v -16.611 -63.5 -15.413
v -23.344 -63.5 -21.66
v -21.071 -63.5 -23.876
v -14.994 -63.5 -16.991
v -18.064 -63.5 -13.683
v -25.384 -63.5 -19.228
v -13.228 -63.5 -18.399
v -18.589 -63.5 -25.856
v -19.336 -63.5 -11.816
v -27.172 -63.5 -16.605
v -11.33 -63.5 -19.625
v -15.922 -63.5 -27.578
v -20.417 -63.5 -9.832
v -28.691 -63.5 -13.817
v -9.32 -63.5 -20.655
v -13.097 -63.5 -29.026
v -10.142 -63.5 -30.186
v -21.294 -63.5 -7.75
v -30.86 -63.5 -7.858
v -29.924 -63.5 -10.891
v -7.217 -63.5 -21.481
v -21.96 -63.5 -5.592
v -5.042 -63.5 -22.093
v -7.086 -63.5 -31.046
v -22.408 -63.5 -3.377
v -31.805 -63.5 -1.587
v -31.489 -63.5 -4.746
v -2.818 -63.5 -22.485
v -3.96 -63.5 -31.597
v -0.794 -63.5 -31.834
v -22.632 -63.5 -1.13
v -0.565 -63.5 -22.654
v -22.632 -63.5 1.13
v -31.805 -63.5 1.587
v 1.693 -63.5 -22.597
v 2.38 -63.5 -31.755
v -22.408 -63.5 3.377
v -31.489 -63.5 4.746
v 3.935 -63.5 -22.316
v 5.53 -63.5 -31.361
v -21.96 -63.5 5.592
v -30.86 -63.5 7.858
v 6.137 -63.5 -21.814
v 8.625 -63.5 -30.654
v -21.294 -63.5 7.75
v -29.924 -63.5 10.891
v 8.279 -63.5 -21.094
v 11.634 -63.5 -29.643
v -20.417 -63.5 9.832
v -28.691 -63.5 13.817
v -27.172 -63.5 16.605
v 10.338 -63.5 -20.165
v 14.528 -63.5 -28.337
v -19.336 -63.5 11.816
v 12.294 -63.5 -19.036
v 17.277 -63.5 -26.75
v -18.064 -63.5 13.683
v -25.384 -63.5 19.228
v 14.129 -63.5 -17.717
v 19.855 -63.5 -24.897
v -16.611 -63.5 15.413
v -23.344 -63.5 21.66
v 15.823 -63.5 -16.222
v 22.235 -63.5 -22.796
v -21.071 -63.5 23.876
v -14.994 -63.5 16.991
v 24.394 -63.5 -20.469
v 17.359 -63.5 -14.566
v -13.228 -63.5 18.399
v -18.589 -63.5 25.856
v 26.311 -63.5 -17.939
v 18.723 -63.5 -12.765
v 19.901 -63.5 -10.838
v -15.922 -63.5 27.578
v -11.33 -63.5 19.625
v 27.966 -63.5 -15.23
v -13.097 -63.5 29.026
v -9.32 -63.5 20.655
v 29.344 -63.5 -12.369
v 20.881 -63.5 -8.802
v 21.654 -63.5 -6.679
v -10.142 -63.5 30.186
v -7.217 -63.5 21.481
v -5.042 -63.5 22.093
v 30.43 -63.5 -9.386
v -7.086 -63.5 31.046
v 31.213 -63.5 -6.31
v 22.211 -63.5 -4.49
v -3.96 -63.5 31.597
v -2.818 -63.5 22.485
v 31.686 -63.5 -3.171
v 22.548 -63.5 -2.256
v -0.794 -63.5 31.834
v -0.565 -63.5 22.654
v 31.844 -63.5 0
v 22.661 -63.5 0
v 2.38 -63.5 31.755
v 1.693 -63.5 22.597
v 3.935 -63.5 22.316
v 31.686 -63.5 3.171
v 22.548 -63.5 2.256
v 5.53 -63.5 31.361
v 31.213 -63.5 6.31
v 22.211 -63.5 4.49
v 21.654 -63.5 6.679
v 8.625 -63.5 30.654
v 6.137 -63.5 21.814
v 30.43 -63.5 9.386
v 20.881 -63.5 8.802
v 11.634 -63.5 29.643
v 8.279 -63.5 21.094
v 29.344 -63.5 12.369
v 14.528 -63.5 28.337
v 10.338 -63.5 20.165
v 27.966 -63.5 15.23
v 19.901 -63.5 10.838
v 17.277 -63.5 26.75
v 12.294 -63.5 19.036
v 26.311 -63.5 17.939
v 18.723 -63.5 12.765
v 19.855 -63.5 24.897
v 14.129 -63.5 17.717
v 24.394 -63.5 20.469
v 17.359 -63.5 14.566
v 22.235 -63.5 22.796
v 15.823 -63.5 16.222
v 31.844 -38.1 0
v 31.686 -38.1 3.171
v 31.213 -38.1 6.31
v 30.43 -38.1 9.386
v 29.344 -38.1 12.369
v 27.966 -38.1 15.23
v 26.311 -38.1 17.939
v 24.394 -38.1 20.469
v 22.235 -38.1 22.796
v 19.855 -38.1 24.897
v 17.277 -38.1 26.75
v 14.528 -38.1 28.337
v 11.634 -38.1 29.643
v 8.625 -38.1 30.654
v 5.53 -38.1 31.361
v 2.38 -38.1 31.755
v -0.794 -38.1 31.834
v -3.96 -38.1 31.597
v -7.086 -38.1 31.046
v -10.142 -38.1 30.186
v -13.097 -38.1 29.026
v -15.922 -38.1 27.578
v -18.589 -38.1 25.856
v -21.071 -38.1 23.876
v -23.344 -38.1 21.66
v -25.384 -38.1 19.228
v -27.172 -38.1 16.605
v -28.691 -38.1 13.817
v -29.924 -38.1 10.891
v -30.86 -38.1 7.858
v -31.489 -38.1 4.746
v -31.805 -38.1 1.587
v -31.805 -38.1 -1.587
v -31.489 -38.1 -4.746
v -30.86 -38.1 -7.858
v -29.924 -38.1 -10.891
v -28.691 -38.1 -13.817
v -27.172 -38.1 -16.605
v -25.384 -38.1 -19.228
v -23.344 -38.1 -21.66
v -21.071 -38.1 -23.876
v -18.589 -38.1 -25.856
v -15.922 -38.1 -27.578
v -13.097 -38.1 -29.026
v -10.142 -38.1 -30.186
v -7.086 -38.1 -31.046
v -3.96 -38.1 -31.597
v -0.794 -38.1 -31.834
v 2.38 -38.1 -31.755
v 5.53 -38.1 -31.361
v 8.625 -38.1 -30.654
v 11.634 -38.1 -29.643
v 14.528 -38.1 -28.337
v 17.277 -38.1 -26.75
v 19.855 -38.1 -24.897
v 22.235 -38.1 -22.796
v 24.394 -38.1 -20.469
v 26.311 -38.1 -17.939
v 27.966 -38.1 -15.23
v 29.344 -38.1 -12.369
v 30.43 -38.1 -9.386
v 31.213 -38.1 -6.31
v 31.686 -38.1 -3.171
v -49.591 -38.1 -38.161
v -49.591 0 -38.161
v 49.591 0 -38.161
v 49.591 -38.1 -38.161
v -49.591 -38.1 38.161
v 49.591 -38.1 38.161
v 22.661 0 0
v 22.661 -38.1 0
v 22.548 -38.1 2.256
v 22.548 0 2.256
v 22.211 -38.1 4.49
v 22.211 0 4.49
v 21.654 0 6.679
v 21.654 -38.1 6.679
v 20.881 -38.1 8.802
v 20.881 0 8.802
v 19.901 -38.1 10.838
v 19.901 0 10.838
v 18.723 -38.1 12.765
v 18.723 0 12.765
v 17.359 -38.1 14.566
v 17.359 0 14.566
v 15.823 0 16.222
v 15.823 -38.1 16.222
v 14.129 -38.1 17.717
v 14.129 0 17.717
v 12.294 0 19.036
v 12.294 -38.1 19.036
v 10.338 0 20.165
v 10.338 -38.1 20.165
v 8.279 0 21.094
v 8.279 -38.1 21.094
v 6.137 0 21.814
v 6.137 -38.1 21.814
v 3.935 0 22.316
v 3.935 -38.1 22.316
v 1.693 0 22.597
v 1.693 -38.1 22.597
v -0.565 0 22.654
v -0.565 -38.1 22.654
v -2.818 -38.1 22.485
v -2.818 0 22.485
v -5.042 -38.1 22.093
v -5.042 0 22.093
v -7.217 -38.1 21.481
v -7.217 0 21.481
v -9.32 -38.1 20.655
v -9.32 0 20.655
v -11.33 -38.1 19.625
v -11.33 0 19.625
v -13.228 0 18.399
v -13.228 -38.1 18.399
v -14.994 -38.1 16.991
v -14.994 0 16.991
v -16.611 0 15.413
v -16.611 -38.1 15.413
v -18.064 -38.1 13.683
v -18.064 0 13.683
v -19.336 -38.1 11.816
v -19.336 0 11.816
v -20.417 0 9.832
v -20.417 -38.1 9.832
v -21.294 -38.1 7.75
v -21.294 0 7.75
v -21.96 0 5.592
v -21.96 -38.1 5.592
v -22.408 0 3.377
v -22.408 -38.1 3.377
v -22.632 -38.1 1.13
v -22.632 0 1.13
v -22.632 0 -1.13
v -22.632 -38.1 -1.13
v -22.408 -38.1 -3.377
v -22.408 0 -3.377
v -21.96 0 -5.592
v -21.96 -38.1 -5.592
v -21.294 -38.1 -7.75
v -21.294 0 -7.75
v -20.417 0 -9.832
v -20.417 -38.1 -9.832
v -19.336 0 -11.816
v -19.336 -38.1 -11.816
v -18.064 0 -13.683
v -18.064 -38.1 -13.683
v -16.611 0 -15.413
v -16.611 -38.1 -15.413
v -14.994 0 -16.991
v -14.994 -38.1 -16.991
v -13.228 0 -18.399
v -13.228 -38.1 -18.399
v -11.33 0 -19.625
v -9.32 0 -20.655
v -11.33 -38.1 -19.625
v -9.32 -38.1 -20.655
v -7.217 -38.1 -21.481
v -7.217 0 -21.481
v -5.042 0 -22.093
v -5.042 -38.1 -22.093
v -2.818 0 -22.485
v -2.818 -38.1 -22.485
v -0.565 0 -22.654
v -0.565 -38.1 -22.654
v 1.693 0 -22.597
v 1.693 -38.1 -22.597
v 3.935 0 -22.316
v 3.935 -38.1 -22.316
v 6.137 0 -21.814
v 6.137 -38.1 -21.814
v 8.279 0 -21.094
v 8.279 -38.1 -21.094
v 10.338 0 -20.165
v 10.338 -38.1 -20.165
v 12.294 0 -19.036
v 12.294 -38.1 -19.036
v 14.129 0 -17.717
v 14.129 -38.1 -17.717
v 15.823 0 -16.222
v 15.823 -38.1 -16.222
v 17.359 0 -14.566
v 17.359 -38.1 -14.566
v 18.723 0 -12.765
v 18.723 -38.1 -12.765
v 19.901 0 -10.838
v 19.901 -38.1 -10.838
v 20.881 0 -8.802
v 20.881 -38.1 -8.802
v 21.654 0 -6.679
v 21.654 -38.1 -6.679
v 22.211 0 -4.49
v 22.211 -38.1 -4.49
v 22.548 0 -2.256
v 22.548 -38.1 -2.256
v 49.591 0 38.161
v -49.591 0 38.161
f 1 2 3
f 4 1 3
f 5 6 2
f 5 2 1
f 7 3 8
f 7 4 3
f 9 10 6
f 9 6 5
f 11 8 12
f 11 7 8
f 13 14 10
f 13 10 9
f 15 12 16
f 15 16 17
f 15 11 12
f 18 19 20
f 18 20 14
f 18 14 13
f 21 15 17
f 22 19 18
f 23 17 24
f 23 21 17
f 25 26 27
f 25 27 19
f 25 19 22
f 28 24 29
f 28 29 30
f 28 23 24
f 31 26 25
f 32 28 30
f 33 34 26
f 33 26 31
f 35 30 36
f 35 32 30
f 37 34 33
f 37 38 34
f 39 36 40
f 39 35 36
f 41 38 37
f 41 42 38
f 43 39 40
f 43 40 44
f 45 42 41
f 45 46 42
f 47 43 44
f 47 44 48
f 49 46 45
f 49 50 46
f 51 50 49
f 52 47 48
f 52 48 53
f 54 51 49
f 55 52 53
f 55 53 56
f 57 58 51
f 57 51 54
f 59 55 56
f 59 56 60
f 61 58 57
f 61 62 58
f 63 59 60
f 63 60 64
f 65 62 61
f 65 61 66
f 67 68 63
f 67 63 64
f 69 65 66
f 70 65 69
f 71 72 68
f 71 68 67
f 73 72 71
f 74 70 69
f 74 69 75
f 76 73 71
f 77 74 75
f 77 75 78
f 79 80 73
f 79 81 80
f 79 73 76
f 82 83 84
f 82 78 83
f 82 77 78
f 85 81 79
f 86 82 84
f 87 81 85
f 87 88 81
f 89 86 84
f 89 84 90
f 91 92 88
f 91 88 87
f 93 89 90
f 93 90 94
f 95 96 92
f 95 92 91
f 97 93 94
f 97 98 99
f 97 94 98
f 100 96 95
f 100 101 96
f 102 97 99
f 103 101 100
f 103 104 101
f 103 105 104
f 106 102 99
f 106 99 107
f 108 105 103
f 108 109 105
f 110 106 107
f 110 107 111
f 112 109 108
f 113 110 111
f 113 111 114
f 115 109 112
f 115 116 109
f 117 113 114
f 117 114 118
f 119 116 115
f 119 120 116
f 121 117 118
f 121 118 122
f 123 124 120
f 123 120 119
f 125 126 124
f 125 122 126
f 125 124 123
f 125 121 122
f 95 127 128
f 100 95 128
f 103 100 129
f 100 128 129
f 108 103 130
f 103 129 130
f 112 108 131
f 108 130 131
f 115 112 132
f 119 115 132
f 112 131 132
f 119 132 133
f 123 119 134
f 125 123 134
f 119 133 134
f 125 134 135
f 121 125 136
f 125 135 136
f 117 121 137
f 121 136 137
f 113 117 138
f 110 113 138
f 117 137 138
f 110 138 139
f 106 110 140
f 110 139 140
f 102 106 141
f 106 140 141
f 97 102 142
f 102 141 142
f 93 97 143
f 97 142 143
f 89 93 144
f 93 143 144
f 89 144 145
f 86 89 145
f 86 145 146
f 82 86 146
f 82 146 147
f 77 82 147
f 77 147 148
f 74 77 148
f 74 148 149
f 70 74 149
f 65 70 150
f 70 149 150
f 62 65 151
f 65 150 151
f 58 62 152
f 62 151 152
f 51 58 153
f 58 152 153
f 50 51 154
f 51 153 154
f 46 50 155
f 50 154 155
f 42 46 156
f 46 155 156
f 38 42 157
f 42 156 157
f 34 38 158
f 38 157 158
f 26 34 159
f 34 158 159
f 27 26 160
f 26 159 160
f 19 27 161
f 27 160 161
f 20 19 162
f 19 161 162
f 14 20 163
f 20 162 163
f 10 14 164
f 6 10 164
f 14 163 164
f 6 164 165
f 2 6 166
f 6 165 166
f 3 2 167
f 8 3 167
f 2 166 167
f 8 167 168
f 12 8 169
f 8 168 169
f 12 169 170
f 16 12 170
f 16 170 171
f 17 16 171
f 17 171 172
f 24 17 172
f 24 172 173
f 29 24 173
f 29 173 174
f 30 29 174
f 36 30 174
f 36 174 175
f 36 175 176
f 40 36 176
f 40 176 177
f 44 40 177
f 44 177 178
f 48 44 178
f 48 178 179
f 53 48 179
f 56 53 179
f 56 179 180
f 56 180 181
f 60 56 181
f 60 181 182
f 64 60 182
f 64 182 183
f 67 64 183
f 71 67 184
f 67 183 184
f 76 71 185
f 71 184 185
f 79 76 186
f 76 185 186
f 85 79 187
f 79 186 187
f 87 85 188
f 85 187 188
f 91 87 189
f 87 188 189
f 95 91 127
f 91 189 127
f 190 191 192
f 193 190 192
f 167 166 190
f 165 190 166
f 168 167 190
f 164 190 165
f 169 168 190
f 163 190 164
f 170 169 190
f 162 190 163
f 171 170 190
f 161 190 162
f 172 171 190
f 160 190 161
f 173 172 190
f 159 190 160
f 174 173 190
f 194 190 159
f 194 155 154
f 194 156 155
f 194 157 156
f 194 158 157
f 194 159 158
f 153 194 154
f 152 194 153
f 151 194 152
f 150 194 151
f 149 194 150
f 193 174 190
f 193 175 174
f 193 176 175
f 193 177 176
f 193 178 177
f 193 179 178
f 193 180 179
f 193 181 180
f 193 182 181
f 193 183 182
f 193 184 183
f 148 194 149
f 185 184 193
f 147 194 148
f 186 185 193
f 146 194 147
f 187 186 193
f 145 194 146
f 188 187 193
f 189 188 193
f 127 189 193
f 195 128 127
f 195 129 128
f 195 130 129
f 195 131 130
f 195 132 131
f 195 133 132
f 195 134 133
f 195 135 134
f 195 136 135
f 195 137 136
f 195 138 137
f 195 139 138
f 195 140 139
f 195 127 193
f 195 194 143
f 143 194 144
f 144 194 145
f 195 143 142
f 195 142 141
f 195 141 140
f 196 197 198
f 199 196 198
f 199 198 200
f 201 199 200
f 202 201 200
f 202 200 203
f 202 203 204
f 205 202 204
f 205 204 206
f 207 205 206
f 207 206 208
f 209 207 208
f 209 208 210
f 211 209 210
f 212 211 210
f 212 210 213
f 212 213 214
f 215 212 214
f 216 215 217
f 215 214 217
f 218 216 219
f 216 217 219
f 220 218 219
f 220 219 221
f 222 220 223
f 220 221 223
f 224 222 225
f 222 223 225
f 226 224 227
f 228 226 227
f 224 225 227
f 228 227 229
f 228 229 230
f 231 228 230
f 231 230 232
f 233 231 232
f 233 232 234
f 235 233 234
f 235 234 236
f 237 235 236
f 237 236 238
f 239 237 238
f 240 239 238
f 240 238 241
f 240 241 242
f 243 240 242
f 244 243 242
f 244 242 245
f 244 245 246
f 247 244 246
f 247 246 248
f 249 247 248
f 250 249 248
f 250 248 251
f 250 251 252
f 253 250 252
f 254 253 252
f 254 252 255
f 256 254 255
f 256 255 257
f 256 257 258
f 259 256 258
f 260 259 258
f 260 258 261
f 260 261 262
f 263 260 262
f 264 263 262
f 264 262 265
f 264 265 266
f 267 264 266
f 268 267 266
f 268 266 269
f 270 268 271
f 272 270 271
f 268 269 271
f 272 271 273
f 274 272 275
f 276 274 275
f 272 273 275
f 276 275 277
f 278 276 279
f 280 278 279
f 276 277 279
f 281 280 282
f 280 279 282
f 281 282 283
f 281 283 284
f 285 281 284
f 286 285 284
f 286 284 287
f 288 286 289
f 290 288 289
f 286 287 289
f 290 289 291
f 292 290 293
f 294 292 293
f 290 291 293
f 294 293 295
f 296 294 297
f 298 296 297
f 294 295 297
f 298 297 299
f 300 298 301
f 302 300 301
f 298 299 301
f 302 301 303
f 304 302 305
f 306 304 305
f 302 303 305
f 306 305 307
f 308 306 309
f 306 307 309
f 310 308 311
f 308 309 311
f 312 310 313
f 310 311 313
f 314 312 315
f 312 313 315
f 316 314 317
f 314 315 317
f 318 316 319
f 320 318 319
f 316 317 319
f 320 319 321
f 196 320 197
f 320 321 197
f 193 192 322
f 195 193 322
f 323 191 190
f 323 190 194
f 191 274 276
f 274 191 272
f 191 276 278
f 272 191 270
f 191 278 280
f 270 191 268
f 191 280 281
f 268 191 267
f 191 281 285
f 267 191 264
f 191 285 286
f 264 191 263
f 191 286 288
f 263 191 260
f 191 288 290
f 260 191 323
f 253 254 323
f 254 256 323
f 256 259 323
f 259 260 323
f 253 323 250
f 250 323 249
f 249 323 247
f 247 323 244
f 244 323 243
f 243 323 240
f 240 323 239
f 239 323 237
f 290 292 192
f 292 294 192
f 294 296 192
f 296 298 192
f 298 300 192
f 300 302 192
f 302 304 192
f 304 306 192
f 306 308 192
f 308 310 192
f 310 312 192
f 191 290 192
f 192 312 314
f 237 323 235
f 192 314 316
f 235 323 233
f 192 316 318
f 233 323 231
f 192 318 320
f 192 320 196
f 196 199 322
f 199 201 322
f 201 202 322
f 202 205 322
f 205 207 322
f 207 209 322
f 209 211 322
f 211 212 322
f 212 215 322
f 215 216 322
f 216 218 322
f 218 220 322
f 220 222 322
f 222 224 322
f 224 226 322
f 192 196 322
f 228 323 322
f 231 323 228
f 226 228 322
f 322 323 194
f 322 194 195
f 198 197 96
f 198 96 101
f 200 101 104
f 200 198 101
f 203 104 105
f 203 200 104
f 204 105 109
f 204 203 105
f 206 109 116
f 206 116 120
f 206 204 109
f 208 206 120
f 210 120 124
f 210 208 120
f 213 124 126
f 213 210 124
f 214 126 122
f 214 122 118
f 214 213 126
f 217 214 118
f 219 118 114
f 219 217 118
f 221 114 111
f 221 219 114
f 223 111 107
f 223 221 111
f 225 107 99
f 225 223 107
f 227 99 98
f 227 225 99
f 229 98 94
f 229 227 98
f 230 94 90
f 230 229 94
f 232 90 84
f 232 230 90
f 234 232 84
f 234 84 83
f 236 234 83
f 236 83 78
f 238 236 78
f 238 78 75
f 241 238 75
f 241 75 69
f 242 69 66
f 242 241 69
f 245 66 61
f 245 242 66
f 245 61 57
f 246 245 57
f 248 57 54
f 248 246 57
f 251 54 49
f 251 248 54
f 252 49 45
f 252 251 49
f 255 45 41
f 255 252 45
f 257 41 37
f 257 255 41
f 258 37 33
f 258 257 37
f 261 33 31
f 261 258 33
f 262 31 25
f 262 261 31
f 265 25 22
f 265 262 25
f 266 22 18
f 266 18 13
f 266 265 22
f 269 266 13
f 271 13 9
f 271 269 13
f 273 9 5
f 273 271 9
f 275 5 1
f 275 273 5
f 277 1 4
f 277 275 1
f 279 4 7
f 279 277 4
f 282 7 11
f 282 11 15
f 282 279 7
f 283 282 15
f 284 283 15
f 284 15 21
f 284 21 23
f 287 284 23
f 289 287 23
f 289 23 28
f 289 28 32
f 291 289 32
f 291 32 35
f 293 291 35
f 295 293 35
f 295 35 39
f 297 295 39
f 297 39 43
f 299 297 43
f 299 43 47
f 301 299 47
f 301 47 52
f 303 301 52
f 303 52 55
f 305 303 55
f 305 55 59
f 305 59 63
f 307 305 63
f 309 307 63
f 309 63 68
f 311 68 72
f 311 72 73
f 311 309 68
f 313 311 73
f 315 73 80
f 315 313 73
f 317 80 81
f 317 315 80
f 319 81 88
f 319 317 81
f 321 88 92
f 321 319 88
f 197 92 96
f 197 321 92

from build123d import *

# Parameters (mm, degrees)
F0_W     = 99.182904
F0_H     = 76.322906
F1_DEPTH = 38.1
F2_R     = 31.844331
F2_R_2   = 22.660652
F3_DEPTH = 25.4
F4_R     = 22.660652
F5_DEPTH = 76.2


with BuildPart() as f1:
    # F0 (on Front) → F1 (new body)
    with BuildSketch(Plane.XZ):
        Rectangle(F0_W, F0_H)
    extrude(amount=F1_DEPTH)

    # F2 (on face) → F3 (join)
    with BuildSketch(Plane.XZ.offset(38.1)):
        Circle(F2_R)
        Circle(F2_R_2, mode=Mode.SUBTRACT)
    extrude(amount=F3_DEPTH)

    # F4 (on face) → F5 (cut)
    with BuildSketch(Plane.XZ.offset(38.1)):
        Circle(F4_R)
    extrude(amount=-F5_DEPTH, mode=Mode.SUBTRACT)


solid = f1.part
